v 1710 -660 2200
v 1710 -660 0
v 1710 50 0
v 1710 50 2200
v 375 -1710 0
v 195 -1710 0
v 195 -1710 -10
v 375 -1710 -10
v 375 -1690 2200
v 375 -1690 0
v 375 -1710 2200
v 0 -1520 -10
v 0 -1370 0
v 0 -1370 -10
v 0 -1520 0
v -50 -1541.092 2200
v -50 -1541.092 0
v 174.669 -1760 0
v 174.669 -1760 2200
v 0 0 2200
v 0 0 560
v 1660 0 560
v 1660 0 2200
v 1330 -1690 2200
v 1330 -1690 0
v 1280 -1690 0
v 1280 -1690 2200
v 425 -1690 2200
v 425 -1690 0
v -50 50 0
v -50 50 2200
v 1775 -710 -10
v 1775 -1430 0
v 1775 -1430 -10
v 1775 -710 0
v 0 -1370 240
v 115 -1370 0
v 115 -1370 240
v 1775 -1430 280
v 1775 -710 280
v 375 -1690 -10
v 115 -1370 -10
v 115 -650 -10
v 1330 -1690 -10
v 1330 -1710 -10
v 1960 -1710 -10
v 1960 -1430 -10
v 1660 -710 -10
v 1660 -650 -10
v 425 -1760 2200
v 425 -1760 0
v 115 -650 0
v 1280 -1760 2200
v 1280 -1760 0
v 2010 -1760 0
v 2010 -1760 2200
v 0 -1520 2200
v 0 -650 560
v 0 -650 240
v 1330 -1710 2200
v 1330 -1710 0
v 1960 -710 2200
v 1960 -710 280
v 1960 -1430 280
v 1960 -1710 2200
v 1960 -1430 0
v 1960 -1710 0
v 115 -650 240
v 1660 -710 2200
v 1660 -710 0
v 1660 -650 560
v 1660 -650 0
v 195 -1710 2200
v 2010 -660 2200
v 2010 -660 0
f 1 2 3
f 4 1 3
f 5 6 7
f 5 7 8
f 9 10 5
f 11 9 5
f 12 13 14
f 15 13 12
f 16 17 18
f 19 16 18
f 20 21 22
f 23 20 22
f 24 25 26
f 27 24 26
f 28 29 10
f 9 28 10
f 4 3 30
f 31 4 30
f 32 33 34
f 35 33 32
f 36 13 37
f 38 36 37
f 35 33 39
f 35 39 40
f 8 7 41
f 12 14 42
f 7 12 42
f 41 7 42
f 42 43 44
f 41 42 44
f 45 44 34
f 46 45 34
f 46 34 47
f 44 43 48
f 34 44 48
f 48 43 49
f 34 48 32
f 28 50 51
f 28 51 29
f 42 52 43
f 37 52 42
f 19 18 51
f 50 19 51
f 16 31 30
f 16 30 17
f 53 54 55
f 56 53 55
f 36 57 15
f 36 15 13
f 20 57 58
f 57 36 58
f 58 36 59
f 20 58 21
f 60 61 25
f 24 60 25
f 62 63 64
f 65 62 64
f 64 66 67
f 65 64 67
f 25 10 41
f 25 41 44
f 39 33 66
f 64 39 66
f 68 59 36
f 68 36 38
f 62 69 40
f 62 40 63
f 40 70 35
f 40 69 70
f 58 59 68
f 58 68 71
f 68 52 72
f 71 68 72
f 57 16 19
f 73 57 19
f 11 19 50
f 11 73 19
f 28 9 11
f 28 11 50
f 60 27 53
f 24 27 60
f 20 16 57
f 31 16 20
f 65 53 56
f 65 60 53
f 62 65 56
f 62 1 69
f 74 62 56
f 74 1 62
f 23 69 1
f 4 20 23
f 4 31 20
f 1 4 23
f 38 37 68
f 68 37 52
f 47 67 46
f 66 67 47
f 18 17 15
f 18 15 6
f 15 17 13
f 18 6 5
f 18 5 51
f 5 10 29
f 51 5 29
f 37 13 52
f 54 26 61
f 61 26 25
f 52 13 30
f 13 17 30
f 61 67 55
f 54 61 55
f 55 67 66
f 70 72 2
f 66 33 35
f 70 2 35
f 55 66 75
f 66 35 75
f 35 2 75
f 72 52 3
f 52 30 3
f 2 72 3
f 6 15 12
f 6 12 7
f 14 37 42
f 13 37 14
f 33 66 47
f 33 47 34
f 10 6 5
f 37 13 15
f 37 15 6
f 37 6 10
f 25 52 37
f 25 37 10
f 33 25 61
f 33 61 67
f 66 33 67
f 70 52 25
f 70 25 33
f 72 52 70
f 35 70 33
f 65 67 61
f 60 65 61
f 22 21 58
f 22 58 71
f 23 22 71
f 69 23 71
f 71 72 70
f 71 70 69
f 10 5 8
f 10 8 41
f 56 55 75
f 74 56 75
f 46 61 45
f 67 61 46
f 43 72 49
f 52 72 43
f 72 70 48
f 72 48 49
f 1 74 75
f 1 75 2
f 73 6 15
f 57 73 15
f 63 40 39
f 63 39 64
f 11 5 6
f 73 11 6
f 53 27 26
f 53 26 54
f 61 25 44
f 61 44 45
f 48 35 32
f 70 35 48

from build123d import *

# Parameters (mm, degrees)
F1_DEPTH = 2200
F2_DEPTH = 560
F0_W     = 115
F0_H     = 720
F3_DEPTH = 240
F0_W_2   = 185
F4_DEPTH = 280
F5_DEPTH = 10


with BuildPart() as f1:
    # F0 (on Top) → F1 (new body)
    with BuildSketch(Plane.XY):
        Polygon((0, -650), (0, 0), (1660, 0), (1660, -650), (1660, -710), (1775, -710), (1960, -710), (1960, -1430), (1960, -1710), (1330, -1710), (1330, -1690), (1280, -1690), (1280, -1740), (1280, -1760), (2010, -1760), (2010, -660), (1710, -660), (1710, 50), (-50, 50), (-50, -1541.092069), (174.668666, -1760), (425, -1760), (425, -1740), (425, -1690), (375, -1690), (375, -1710), (195, -1710), (0, -1520), (0, -1370), align=None)
    extrude(amount=F1_DEPTH)

    # F0 (on Top) → F2 (join)
    with BuildSketch(Plane.XY):
        Polygon((1660, 0), (0, 0), (0, -650), (115, -650), (1660, -650), align=None)
    extrude(amount=F2_DEPTH)

    # F0 (on Top) → F3 (join)
    with BuildSketch(Plane.XY):
        with Locations((57.5, -1010)):
            Rectangle(F0_W, F0_H)
    extrude(amount=F3_DEPTH)

    # F0 (on Top) → F4 (join)
    with BuildSketch(Plane.XY):
        with Locations((1867.5, -1070)):
            Rectangle(F0_W_2, F0_H)
    extrude(amount=F4_DEPTH)


with BuildPart() as f5:
    # F0 (on Top) → F5 (new body)
    with BuildSketch(Plane.XY):
        Polygon((1660, -710), (1660, -650), (115, -650), (115, -1370), (0, -1370), (0, -1520), (195, -1710), (375, -1710), (375, -1690), (425, -1690), (1280, -1690), (1330, -1690), (1330, -1710), (1960, -1710), (1960, -1430), (1775, -1430), (1775, -710), align=None)
    extrude(amount=-F5_DEPTH)


solid = Compound([f1.part, f5.part])
